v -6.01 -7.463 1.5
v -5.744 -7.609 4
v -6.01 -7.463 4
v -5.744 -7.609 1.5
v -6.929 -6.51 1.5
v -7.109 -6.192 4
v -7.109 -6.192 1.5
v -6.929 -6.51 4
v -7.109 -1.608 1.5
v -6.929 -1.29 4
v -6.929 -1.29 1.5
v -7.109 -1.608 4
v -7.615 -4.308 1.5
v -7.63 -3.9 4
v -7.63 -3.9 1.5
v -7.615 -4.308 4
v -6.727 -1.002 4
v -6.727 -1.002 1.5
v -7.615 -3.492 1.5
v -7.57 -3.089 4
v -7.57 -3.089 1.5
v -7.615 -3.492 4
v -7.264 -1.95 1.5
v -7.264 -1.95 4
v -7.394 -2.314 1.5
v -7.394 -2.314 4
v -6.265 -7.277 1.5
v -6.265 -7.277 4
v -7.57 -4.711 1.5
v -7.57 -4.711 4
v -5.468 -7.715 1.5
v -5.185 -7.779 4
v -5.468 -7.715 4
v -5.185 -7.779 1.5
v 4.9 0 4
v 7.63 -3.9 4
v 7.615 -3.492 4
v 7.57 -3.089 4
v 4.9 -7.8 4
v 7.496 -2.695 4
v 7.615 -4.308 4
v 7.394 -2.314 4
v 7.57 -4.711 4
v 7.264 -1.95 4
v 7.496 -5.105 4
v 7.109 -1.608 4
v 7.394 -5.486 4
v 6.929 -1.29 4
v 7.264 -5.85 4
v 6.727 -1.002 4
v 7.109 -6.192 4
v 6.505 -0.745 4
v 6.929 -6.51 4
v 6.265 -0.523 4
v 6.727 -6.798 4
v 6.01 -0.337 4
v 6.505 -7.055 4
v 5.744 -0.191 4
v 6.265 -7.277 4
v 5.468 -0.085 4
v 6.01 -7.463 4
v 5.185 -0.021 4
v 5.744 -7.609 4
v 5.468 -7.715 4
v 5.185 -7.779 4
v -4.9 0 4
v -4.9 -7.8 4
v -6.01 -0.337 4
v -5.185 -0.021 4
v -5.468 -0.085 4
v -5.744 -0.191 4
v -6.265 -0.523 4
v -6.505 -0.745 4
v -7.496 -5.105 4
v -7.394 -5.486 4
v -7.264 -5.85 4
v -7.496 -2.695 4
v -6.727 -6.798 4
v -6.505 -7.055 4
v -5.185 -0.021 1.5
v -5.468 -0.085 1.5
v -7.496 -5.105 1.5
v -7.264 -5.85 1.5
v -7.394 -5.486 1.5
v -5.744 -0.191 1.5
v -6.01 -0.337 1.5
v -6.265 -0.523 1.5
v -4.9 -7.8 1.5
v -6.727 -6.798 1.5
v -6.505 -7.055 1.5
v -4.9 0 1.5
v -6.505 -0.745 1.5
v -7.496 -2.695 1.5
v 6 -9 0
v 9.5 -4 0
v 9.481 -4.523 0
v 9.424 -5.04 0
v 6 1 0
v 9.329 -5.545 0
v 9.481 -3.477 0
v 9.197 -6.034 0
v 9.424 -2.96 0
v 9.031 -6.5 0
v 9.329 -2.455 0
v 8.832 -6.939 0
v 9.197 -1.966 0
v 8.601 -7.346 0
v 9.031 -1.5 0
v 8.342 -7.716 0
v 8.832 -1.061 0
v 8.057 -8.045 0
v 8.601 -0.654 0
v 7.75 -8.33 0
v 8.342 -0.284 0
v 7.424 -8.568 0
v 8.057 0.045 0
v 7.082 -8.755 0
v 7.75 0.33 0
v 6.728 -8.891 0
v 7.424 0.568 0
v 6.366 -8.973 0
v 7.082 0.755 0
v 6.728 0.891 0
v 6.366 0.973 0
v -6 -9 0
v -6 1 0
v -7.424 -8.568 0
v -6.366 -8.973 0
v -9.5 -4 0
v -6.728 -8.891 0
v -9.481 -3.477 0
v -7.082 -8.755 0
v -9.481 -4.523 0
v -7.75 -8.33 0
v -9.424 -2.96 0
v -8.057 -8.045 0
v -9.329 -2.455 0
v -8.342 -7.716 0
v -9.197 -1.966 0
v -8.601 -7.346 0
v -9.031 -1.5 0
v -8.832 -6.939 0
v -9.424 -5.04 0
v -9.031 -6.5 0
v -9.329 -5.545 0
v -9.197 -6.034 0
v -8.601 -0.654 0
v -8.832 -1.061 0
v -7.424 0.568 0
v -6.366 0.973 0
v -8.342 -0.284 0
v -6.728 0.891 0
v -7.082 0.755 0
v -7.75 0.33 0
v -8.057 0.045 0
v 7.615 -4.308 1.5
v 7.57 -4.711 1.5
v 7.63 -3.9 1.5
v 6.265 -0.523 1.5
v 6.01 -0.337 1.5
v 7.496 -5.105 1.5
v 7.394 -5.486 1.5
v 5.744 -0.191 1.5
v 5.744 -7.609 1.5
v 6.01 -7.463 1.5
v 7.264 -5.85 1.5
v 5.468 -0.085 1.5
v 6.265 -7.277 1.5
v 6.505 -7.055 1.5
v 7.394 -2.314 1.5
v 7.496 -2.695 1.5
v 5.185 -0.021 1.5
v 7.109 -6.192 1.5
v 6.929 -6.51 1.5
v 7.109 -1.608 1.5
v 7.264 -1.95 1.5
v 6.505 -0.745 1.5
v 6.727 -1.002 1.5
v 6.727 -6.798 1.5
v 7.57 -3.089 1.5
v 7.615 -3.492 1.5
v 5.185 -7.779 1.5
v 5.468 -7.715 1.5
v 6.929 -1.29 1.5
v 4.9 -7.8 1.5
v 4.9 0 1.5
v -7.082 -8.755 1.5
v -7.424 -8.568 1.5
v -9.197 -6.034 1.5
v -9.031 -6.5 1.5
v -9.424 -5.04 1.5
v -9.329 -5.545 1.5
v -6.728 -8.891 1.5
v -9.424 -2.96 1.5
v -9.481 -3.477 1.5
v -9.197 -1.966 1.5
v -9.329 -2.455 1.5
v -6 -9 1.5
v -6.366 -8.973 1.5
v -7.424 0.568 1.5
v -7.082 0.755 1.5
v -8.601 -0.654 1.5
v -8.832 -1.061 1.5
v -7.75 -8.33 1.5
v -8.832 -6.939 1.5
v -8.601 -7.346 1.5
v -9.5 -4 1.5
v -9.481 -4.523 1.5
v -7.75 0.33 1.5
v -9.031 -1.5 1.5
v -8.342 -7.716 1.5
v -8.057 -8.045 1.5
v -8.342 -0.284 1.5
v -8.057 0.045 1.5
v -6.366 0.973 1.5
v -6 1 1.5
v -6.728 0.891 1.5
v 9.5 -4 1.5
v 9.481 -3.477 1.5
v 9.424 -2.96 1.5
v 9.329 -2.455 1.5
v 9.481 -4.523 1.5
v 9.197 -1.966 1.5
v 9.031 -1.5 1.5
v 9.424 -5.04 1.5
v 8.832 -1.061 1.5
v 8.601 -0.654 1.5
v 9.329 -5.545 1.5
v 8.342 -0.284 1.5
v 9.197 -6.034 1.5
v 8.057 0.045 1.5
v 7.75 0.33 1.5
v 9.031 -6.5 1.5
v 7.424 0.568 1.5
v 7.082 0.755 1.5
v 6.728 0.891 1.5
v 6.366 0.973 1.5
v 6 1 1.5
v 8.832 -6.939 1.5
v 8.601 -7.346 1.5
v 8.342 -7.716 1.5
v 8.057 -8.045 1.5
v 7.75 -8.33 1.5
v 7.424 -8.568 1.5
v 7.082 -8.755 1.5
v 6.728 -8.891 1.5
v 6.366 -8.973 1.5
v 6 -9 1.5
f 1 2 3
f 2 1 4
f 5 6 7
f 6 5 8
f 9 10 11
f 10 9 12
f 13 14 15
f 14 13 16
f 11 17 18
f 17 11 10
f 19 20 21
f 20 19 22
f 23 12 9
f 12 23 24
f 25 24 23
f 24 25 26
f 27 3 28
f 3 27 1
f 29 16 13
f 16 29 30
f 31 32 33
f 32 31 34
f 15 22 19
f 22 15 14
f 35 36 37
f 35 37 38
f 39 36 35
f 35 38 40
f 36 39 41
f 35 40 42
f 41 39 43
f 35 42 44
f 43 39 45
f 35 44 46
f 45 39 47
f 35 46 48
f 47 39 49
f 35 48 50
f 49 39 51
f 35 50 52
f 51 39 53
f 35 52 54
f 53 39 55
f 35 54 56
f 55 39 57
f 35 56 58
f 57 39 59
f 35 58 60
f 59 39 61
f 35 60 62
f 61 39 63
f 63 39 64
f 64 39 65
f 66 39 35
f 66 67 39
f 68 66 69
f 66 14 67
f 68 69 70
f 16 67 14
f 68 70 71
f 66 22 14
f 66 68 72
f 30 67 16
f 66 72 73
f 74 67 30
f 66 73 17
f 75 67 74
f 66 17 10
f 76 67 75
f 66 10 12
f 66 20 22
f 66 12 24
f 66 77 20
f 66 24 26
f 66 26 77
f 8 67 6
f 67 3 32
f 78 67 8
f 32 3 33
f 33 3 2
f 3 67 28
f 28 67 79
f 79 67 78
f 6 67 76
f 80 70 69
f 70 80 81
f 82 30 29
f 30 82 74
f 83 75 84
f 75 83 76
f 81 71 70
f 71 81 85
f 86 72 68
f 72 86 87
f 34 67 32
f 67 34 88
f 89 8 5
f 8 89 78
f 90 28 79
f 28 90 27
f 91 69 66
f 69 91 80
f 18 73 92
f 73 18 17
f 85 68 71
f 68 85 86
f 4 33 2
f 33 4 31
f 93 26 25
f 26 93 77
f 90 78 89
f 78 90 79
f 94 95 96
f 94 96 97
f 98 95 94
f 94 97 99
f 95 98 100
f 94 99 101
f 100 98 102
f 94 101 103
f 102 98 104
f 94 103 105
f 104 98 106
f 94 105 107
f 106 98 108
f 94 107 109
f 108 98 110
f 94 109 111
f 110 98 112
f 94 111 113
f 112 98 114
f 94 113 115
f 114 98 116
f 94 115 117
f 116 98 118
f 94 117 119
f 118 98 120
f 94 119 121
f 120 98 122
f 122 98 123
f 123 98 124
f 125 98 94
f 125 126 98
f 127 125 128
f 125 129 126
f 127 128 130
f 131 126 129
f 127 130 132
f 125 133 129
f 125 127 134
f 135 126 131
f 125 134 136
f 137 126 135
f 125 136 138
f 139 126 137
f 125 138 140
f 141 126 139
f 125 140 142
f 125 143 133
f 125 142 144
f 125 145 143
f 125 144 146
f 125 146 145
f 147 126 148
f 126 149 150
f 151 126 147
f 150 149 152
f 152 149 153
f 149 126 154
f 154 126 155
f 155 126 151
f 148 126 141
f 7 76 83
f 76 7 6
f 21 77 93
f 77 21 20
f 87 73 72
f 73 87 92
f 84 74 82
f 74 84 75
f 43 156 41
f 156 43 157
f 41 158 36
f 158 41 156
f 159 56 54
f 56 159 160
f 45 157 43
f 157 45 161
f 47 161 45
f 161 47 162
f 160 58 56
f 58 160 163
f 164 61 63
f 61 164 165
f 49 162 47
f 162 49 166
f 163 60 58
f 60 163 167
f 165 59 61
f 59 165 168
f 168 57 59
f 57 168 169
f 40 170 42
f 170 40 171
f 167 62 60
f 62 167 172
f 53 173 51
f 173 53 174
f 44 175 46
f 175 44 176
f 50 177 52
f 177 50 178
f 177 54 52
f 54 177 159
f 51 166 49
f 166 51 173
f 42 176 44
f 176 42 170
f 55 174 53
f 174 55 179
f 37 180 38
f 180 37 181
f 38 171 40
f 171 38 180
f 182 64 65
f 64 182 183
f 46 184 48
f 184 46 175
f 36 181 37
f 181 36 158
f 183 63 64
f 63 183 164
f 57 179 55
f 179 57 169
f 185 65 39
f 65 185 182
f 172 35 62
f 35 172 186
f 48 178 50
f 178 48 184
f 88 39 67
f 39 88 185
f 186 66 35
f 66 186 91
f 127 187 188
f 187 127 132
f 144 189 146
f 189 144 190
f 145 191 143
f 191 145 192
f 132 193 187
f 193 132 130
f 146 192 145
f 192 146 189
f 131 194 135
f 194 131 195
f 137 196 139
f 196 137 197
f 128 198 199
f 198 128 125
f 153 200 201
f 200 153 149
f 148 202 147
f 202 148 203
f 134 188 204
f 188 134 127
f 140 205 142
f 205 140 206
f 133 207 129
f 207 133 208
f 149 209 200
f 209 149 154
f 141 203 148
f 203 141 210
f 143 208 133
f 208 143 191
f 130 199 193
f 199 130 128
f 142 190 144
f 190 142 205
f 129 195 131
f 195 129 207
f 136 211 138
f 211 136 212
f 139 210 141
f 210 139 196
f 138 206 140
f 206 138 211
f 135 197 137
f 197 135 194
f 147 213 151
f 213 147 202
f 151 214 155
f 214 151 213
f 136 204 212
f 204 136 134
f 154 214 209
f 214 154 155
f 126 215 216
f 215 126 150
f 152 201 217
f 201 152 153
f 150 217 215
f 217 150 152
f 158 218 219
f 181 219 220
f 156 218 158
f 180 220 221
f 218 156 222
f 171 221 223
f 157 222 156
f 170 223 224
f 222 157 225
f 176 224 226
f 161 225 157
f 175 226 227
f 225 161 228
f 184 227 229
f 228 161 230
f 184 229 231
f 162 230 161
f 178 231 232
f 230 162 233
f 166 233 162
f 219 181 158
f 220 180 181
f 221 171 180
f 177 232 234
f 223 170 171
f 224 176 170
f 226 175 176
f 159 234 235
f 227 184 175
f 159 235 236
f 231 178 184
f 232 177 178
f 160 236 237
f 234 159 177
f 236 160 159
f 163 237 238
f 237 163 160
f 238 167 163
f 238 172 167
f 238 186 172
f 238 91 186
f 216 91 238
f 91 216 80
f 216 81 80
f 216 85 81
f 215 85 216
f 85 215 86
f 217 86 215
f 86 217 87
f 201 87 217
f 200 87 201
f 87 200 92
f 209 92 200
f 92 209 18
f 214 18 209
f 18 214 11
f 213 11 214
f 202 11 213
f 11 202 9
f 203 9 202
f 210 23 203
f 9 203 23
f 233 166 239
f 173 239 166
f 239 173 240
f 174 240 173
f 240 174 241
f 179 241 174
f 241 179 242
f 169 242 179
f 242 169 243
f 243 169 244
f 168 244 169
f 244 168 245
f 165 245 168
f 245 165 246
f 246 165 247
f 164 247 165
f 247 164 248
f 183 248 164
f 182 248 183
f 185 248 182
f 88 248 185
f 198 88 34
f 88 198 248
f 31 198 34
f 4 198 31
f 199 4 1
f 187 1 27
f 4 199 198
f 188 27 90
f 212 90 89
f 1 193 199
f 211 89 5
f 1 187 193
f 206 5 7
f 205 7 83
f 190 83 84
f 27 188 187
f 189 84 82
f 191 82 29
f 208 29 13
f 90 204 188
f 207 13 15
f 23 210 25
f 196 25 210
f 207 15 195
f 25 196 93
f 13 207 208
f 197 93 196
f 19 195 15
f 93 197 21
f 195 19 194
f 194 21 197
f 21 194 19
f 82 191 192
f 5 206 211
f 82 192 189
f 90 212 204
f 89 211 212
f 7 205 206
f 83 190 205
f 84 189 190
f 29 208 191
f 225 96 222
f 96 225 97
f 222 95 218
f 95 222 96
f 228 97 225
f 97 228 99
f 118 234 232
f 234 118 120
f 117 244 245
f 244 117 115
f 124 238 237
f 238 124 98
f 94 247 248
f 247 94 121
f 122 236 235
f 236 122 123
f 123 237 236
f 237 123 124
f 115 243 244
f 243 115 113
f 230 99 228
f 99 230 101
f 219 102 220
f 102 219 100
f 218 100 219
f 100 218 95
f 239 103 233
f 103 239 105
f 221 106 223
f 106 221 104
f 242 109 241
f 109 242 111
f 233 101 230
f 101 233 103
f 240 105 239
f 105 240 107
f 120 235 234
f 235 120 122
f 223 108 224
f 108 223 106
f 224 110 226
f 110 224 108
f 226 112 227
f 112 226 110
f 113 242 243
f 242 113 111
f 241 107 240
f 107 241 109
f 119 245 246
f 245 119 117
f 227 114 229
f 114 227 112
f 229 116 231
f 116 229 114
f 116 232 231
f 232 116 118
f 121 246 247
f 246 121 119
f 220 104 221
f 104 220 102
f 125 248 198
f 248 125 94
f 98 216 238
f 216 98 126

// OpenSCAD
$fn=60;
z_lenght = 20-4.4;
y_width=13.2;
x_depth = 5.1;
x_offset=1;
y_offset=2;
min_y = y_width+y_offset*2;
min_x = x_depth+x_offset*2;
wall = 2;

*difference()
{
    support(5, wall);
    color("red") cutout(5);
}

module make_usb()
{
        usb_a_male([10,20,2]);
}

module make_usb_cutout()
{
    // translate([0.2,(-min_y/2),0])
        cutout(3);
}

module usb_a_male(xyz)
{

    cube([min_x,min_y, xyz[2]]);
    pin_wall();
    translate([0,0,z_lenght]) 
        pin_cap(xyz[2]);

}

module pin_cap(thick)
{
    cube([thick+1, min_y, thick]);
}

module pin_wall()
{
    cube([x_offset,min_y, z_lenght]);
    cube([x_offset+2,y_offset, z_lenght]);
    translate([0,min_y-y_offset,0])
        cube([x_offset+2,y_offset, z_lenght]);
    post_from_edge = 11.5;
    post_spread=6;
    post_offset=(y_width-post_spread) /2;
    translate([x_offset,y_offset+post_offset,post_from_edge]) 
    {
        post();
        translate([0,post_spread,0])
            post();
    }
}

module support(height, wall)
{   
    translate([-x_depth-wall,(-y_width/2)-wall,0])
        cube([x_depth+wall*2,y_width+(wall*2), height]);
}

/*module cutout(height)
{
    translate([x_offset,y_offset,0])
        cube([x_height,y_width, height]);
}*/

module cutout(height)
{
    translate([-x_depth, -y_width/2, 0])
        cube([x_depth, y_width, height]);
}


module post(height=1.6, diameter=2.5) 
{
    rotate([0,90,0])
        cylinder(h=height, d=diameter, $fn=30);
}

rotate([90,0,0]) 
    color("blue")   
        make_usb_b_slot_plug();

module make_usb_b_slot_plug(s, thickness=4, rotate=0, offset=0.2) { 
        make_slot_rounded(width=10-offset,  height=8-offset, thickness=thickness);
        translate([0,0,-1])make_slot_rounded(width=12,  height=10, thickness=1.5);
}
module make_usb_b_slot(s, thickness=10, rotate=0) { 
    rotate([0,0,rotate])
        make_slot_rounded(width=10,  height=8, thickness=thickness);
}

module make_slot_rounded(s, width=10, height=10, pointed=0, curved_ends=1, thickness=5) {
	translate([-width/2,0,0])
	{ 
		cube([width, thickness, height]);
		if (curved_ends == 1) {
			translate([0, thickness, height/2])
				rotate([90,0,0]) 
				scale([0.7,1,1]) 
					cylinder(h = thickness, d = height, center=false);
			 
			translate([width, thickness, height/2])
				rotate([90,0,0])
				scale([0.7,1,1]) 
					cylinder(h = thickness, d = height, center=false); 
		}
	}
}
